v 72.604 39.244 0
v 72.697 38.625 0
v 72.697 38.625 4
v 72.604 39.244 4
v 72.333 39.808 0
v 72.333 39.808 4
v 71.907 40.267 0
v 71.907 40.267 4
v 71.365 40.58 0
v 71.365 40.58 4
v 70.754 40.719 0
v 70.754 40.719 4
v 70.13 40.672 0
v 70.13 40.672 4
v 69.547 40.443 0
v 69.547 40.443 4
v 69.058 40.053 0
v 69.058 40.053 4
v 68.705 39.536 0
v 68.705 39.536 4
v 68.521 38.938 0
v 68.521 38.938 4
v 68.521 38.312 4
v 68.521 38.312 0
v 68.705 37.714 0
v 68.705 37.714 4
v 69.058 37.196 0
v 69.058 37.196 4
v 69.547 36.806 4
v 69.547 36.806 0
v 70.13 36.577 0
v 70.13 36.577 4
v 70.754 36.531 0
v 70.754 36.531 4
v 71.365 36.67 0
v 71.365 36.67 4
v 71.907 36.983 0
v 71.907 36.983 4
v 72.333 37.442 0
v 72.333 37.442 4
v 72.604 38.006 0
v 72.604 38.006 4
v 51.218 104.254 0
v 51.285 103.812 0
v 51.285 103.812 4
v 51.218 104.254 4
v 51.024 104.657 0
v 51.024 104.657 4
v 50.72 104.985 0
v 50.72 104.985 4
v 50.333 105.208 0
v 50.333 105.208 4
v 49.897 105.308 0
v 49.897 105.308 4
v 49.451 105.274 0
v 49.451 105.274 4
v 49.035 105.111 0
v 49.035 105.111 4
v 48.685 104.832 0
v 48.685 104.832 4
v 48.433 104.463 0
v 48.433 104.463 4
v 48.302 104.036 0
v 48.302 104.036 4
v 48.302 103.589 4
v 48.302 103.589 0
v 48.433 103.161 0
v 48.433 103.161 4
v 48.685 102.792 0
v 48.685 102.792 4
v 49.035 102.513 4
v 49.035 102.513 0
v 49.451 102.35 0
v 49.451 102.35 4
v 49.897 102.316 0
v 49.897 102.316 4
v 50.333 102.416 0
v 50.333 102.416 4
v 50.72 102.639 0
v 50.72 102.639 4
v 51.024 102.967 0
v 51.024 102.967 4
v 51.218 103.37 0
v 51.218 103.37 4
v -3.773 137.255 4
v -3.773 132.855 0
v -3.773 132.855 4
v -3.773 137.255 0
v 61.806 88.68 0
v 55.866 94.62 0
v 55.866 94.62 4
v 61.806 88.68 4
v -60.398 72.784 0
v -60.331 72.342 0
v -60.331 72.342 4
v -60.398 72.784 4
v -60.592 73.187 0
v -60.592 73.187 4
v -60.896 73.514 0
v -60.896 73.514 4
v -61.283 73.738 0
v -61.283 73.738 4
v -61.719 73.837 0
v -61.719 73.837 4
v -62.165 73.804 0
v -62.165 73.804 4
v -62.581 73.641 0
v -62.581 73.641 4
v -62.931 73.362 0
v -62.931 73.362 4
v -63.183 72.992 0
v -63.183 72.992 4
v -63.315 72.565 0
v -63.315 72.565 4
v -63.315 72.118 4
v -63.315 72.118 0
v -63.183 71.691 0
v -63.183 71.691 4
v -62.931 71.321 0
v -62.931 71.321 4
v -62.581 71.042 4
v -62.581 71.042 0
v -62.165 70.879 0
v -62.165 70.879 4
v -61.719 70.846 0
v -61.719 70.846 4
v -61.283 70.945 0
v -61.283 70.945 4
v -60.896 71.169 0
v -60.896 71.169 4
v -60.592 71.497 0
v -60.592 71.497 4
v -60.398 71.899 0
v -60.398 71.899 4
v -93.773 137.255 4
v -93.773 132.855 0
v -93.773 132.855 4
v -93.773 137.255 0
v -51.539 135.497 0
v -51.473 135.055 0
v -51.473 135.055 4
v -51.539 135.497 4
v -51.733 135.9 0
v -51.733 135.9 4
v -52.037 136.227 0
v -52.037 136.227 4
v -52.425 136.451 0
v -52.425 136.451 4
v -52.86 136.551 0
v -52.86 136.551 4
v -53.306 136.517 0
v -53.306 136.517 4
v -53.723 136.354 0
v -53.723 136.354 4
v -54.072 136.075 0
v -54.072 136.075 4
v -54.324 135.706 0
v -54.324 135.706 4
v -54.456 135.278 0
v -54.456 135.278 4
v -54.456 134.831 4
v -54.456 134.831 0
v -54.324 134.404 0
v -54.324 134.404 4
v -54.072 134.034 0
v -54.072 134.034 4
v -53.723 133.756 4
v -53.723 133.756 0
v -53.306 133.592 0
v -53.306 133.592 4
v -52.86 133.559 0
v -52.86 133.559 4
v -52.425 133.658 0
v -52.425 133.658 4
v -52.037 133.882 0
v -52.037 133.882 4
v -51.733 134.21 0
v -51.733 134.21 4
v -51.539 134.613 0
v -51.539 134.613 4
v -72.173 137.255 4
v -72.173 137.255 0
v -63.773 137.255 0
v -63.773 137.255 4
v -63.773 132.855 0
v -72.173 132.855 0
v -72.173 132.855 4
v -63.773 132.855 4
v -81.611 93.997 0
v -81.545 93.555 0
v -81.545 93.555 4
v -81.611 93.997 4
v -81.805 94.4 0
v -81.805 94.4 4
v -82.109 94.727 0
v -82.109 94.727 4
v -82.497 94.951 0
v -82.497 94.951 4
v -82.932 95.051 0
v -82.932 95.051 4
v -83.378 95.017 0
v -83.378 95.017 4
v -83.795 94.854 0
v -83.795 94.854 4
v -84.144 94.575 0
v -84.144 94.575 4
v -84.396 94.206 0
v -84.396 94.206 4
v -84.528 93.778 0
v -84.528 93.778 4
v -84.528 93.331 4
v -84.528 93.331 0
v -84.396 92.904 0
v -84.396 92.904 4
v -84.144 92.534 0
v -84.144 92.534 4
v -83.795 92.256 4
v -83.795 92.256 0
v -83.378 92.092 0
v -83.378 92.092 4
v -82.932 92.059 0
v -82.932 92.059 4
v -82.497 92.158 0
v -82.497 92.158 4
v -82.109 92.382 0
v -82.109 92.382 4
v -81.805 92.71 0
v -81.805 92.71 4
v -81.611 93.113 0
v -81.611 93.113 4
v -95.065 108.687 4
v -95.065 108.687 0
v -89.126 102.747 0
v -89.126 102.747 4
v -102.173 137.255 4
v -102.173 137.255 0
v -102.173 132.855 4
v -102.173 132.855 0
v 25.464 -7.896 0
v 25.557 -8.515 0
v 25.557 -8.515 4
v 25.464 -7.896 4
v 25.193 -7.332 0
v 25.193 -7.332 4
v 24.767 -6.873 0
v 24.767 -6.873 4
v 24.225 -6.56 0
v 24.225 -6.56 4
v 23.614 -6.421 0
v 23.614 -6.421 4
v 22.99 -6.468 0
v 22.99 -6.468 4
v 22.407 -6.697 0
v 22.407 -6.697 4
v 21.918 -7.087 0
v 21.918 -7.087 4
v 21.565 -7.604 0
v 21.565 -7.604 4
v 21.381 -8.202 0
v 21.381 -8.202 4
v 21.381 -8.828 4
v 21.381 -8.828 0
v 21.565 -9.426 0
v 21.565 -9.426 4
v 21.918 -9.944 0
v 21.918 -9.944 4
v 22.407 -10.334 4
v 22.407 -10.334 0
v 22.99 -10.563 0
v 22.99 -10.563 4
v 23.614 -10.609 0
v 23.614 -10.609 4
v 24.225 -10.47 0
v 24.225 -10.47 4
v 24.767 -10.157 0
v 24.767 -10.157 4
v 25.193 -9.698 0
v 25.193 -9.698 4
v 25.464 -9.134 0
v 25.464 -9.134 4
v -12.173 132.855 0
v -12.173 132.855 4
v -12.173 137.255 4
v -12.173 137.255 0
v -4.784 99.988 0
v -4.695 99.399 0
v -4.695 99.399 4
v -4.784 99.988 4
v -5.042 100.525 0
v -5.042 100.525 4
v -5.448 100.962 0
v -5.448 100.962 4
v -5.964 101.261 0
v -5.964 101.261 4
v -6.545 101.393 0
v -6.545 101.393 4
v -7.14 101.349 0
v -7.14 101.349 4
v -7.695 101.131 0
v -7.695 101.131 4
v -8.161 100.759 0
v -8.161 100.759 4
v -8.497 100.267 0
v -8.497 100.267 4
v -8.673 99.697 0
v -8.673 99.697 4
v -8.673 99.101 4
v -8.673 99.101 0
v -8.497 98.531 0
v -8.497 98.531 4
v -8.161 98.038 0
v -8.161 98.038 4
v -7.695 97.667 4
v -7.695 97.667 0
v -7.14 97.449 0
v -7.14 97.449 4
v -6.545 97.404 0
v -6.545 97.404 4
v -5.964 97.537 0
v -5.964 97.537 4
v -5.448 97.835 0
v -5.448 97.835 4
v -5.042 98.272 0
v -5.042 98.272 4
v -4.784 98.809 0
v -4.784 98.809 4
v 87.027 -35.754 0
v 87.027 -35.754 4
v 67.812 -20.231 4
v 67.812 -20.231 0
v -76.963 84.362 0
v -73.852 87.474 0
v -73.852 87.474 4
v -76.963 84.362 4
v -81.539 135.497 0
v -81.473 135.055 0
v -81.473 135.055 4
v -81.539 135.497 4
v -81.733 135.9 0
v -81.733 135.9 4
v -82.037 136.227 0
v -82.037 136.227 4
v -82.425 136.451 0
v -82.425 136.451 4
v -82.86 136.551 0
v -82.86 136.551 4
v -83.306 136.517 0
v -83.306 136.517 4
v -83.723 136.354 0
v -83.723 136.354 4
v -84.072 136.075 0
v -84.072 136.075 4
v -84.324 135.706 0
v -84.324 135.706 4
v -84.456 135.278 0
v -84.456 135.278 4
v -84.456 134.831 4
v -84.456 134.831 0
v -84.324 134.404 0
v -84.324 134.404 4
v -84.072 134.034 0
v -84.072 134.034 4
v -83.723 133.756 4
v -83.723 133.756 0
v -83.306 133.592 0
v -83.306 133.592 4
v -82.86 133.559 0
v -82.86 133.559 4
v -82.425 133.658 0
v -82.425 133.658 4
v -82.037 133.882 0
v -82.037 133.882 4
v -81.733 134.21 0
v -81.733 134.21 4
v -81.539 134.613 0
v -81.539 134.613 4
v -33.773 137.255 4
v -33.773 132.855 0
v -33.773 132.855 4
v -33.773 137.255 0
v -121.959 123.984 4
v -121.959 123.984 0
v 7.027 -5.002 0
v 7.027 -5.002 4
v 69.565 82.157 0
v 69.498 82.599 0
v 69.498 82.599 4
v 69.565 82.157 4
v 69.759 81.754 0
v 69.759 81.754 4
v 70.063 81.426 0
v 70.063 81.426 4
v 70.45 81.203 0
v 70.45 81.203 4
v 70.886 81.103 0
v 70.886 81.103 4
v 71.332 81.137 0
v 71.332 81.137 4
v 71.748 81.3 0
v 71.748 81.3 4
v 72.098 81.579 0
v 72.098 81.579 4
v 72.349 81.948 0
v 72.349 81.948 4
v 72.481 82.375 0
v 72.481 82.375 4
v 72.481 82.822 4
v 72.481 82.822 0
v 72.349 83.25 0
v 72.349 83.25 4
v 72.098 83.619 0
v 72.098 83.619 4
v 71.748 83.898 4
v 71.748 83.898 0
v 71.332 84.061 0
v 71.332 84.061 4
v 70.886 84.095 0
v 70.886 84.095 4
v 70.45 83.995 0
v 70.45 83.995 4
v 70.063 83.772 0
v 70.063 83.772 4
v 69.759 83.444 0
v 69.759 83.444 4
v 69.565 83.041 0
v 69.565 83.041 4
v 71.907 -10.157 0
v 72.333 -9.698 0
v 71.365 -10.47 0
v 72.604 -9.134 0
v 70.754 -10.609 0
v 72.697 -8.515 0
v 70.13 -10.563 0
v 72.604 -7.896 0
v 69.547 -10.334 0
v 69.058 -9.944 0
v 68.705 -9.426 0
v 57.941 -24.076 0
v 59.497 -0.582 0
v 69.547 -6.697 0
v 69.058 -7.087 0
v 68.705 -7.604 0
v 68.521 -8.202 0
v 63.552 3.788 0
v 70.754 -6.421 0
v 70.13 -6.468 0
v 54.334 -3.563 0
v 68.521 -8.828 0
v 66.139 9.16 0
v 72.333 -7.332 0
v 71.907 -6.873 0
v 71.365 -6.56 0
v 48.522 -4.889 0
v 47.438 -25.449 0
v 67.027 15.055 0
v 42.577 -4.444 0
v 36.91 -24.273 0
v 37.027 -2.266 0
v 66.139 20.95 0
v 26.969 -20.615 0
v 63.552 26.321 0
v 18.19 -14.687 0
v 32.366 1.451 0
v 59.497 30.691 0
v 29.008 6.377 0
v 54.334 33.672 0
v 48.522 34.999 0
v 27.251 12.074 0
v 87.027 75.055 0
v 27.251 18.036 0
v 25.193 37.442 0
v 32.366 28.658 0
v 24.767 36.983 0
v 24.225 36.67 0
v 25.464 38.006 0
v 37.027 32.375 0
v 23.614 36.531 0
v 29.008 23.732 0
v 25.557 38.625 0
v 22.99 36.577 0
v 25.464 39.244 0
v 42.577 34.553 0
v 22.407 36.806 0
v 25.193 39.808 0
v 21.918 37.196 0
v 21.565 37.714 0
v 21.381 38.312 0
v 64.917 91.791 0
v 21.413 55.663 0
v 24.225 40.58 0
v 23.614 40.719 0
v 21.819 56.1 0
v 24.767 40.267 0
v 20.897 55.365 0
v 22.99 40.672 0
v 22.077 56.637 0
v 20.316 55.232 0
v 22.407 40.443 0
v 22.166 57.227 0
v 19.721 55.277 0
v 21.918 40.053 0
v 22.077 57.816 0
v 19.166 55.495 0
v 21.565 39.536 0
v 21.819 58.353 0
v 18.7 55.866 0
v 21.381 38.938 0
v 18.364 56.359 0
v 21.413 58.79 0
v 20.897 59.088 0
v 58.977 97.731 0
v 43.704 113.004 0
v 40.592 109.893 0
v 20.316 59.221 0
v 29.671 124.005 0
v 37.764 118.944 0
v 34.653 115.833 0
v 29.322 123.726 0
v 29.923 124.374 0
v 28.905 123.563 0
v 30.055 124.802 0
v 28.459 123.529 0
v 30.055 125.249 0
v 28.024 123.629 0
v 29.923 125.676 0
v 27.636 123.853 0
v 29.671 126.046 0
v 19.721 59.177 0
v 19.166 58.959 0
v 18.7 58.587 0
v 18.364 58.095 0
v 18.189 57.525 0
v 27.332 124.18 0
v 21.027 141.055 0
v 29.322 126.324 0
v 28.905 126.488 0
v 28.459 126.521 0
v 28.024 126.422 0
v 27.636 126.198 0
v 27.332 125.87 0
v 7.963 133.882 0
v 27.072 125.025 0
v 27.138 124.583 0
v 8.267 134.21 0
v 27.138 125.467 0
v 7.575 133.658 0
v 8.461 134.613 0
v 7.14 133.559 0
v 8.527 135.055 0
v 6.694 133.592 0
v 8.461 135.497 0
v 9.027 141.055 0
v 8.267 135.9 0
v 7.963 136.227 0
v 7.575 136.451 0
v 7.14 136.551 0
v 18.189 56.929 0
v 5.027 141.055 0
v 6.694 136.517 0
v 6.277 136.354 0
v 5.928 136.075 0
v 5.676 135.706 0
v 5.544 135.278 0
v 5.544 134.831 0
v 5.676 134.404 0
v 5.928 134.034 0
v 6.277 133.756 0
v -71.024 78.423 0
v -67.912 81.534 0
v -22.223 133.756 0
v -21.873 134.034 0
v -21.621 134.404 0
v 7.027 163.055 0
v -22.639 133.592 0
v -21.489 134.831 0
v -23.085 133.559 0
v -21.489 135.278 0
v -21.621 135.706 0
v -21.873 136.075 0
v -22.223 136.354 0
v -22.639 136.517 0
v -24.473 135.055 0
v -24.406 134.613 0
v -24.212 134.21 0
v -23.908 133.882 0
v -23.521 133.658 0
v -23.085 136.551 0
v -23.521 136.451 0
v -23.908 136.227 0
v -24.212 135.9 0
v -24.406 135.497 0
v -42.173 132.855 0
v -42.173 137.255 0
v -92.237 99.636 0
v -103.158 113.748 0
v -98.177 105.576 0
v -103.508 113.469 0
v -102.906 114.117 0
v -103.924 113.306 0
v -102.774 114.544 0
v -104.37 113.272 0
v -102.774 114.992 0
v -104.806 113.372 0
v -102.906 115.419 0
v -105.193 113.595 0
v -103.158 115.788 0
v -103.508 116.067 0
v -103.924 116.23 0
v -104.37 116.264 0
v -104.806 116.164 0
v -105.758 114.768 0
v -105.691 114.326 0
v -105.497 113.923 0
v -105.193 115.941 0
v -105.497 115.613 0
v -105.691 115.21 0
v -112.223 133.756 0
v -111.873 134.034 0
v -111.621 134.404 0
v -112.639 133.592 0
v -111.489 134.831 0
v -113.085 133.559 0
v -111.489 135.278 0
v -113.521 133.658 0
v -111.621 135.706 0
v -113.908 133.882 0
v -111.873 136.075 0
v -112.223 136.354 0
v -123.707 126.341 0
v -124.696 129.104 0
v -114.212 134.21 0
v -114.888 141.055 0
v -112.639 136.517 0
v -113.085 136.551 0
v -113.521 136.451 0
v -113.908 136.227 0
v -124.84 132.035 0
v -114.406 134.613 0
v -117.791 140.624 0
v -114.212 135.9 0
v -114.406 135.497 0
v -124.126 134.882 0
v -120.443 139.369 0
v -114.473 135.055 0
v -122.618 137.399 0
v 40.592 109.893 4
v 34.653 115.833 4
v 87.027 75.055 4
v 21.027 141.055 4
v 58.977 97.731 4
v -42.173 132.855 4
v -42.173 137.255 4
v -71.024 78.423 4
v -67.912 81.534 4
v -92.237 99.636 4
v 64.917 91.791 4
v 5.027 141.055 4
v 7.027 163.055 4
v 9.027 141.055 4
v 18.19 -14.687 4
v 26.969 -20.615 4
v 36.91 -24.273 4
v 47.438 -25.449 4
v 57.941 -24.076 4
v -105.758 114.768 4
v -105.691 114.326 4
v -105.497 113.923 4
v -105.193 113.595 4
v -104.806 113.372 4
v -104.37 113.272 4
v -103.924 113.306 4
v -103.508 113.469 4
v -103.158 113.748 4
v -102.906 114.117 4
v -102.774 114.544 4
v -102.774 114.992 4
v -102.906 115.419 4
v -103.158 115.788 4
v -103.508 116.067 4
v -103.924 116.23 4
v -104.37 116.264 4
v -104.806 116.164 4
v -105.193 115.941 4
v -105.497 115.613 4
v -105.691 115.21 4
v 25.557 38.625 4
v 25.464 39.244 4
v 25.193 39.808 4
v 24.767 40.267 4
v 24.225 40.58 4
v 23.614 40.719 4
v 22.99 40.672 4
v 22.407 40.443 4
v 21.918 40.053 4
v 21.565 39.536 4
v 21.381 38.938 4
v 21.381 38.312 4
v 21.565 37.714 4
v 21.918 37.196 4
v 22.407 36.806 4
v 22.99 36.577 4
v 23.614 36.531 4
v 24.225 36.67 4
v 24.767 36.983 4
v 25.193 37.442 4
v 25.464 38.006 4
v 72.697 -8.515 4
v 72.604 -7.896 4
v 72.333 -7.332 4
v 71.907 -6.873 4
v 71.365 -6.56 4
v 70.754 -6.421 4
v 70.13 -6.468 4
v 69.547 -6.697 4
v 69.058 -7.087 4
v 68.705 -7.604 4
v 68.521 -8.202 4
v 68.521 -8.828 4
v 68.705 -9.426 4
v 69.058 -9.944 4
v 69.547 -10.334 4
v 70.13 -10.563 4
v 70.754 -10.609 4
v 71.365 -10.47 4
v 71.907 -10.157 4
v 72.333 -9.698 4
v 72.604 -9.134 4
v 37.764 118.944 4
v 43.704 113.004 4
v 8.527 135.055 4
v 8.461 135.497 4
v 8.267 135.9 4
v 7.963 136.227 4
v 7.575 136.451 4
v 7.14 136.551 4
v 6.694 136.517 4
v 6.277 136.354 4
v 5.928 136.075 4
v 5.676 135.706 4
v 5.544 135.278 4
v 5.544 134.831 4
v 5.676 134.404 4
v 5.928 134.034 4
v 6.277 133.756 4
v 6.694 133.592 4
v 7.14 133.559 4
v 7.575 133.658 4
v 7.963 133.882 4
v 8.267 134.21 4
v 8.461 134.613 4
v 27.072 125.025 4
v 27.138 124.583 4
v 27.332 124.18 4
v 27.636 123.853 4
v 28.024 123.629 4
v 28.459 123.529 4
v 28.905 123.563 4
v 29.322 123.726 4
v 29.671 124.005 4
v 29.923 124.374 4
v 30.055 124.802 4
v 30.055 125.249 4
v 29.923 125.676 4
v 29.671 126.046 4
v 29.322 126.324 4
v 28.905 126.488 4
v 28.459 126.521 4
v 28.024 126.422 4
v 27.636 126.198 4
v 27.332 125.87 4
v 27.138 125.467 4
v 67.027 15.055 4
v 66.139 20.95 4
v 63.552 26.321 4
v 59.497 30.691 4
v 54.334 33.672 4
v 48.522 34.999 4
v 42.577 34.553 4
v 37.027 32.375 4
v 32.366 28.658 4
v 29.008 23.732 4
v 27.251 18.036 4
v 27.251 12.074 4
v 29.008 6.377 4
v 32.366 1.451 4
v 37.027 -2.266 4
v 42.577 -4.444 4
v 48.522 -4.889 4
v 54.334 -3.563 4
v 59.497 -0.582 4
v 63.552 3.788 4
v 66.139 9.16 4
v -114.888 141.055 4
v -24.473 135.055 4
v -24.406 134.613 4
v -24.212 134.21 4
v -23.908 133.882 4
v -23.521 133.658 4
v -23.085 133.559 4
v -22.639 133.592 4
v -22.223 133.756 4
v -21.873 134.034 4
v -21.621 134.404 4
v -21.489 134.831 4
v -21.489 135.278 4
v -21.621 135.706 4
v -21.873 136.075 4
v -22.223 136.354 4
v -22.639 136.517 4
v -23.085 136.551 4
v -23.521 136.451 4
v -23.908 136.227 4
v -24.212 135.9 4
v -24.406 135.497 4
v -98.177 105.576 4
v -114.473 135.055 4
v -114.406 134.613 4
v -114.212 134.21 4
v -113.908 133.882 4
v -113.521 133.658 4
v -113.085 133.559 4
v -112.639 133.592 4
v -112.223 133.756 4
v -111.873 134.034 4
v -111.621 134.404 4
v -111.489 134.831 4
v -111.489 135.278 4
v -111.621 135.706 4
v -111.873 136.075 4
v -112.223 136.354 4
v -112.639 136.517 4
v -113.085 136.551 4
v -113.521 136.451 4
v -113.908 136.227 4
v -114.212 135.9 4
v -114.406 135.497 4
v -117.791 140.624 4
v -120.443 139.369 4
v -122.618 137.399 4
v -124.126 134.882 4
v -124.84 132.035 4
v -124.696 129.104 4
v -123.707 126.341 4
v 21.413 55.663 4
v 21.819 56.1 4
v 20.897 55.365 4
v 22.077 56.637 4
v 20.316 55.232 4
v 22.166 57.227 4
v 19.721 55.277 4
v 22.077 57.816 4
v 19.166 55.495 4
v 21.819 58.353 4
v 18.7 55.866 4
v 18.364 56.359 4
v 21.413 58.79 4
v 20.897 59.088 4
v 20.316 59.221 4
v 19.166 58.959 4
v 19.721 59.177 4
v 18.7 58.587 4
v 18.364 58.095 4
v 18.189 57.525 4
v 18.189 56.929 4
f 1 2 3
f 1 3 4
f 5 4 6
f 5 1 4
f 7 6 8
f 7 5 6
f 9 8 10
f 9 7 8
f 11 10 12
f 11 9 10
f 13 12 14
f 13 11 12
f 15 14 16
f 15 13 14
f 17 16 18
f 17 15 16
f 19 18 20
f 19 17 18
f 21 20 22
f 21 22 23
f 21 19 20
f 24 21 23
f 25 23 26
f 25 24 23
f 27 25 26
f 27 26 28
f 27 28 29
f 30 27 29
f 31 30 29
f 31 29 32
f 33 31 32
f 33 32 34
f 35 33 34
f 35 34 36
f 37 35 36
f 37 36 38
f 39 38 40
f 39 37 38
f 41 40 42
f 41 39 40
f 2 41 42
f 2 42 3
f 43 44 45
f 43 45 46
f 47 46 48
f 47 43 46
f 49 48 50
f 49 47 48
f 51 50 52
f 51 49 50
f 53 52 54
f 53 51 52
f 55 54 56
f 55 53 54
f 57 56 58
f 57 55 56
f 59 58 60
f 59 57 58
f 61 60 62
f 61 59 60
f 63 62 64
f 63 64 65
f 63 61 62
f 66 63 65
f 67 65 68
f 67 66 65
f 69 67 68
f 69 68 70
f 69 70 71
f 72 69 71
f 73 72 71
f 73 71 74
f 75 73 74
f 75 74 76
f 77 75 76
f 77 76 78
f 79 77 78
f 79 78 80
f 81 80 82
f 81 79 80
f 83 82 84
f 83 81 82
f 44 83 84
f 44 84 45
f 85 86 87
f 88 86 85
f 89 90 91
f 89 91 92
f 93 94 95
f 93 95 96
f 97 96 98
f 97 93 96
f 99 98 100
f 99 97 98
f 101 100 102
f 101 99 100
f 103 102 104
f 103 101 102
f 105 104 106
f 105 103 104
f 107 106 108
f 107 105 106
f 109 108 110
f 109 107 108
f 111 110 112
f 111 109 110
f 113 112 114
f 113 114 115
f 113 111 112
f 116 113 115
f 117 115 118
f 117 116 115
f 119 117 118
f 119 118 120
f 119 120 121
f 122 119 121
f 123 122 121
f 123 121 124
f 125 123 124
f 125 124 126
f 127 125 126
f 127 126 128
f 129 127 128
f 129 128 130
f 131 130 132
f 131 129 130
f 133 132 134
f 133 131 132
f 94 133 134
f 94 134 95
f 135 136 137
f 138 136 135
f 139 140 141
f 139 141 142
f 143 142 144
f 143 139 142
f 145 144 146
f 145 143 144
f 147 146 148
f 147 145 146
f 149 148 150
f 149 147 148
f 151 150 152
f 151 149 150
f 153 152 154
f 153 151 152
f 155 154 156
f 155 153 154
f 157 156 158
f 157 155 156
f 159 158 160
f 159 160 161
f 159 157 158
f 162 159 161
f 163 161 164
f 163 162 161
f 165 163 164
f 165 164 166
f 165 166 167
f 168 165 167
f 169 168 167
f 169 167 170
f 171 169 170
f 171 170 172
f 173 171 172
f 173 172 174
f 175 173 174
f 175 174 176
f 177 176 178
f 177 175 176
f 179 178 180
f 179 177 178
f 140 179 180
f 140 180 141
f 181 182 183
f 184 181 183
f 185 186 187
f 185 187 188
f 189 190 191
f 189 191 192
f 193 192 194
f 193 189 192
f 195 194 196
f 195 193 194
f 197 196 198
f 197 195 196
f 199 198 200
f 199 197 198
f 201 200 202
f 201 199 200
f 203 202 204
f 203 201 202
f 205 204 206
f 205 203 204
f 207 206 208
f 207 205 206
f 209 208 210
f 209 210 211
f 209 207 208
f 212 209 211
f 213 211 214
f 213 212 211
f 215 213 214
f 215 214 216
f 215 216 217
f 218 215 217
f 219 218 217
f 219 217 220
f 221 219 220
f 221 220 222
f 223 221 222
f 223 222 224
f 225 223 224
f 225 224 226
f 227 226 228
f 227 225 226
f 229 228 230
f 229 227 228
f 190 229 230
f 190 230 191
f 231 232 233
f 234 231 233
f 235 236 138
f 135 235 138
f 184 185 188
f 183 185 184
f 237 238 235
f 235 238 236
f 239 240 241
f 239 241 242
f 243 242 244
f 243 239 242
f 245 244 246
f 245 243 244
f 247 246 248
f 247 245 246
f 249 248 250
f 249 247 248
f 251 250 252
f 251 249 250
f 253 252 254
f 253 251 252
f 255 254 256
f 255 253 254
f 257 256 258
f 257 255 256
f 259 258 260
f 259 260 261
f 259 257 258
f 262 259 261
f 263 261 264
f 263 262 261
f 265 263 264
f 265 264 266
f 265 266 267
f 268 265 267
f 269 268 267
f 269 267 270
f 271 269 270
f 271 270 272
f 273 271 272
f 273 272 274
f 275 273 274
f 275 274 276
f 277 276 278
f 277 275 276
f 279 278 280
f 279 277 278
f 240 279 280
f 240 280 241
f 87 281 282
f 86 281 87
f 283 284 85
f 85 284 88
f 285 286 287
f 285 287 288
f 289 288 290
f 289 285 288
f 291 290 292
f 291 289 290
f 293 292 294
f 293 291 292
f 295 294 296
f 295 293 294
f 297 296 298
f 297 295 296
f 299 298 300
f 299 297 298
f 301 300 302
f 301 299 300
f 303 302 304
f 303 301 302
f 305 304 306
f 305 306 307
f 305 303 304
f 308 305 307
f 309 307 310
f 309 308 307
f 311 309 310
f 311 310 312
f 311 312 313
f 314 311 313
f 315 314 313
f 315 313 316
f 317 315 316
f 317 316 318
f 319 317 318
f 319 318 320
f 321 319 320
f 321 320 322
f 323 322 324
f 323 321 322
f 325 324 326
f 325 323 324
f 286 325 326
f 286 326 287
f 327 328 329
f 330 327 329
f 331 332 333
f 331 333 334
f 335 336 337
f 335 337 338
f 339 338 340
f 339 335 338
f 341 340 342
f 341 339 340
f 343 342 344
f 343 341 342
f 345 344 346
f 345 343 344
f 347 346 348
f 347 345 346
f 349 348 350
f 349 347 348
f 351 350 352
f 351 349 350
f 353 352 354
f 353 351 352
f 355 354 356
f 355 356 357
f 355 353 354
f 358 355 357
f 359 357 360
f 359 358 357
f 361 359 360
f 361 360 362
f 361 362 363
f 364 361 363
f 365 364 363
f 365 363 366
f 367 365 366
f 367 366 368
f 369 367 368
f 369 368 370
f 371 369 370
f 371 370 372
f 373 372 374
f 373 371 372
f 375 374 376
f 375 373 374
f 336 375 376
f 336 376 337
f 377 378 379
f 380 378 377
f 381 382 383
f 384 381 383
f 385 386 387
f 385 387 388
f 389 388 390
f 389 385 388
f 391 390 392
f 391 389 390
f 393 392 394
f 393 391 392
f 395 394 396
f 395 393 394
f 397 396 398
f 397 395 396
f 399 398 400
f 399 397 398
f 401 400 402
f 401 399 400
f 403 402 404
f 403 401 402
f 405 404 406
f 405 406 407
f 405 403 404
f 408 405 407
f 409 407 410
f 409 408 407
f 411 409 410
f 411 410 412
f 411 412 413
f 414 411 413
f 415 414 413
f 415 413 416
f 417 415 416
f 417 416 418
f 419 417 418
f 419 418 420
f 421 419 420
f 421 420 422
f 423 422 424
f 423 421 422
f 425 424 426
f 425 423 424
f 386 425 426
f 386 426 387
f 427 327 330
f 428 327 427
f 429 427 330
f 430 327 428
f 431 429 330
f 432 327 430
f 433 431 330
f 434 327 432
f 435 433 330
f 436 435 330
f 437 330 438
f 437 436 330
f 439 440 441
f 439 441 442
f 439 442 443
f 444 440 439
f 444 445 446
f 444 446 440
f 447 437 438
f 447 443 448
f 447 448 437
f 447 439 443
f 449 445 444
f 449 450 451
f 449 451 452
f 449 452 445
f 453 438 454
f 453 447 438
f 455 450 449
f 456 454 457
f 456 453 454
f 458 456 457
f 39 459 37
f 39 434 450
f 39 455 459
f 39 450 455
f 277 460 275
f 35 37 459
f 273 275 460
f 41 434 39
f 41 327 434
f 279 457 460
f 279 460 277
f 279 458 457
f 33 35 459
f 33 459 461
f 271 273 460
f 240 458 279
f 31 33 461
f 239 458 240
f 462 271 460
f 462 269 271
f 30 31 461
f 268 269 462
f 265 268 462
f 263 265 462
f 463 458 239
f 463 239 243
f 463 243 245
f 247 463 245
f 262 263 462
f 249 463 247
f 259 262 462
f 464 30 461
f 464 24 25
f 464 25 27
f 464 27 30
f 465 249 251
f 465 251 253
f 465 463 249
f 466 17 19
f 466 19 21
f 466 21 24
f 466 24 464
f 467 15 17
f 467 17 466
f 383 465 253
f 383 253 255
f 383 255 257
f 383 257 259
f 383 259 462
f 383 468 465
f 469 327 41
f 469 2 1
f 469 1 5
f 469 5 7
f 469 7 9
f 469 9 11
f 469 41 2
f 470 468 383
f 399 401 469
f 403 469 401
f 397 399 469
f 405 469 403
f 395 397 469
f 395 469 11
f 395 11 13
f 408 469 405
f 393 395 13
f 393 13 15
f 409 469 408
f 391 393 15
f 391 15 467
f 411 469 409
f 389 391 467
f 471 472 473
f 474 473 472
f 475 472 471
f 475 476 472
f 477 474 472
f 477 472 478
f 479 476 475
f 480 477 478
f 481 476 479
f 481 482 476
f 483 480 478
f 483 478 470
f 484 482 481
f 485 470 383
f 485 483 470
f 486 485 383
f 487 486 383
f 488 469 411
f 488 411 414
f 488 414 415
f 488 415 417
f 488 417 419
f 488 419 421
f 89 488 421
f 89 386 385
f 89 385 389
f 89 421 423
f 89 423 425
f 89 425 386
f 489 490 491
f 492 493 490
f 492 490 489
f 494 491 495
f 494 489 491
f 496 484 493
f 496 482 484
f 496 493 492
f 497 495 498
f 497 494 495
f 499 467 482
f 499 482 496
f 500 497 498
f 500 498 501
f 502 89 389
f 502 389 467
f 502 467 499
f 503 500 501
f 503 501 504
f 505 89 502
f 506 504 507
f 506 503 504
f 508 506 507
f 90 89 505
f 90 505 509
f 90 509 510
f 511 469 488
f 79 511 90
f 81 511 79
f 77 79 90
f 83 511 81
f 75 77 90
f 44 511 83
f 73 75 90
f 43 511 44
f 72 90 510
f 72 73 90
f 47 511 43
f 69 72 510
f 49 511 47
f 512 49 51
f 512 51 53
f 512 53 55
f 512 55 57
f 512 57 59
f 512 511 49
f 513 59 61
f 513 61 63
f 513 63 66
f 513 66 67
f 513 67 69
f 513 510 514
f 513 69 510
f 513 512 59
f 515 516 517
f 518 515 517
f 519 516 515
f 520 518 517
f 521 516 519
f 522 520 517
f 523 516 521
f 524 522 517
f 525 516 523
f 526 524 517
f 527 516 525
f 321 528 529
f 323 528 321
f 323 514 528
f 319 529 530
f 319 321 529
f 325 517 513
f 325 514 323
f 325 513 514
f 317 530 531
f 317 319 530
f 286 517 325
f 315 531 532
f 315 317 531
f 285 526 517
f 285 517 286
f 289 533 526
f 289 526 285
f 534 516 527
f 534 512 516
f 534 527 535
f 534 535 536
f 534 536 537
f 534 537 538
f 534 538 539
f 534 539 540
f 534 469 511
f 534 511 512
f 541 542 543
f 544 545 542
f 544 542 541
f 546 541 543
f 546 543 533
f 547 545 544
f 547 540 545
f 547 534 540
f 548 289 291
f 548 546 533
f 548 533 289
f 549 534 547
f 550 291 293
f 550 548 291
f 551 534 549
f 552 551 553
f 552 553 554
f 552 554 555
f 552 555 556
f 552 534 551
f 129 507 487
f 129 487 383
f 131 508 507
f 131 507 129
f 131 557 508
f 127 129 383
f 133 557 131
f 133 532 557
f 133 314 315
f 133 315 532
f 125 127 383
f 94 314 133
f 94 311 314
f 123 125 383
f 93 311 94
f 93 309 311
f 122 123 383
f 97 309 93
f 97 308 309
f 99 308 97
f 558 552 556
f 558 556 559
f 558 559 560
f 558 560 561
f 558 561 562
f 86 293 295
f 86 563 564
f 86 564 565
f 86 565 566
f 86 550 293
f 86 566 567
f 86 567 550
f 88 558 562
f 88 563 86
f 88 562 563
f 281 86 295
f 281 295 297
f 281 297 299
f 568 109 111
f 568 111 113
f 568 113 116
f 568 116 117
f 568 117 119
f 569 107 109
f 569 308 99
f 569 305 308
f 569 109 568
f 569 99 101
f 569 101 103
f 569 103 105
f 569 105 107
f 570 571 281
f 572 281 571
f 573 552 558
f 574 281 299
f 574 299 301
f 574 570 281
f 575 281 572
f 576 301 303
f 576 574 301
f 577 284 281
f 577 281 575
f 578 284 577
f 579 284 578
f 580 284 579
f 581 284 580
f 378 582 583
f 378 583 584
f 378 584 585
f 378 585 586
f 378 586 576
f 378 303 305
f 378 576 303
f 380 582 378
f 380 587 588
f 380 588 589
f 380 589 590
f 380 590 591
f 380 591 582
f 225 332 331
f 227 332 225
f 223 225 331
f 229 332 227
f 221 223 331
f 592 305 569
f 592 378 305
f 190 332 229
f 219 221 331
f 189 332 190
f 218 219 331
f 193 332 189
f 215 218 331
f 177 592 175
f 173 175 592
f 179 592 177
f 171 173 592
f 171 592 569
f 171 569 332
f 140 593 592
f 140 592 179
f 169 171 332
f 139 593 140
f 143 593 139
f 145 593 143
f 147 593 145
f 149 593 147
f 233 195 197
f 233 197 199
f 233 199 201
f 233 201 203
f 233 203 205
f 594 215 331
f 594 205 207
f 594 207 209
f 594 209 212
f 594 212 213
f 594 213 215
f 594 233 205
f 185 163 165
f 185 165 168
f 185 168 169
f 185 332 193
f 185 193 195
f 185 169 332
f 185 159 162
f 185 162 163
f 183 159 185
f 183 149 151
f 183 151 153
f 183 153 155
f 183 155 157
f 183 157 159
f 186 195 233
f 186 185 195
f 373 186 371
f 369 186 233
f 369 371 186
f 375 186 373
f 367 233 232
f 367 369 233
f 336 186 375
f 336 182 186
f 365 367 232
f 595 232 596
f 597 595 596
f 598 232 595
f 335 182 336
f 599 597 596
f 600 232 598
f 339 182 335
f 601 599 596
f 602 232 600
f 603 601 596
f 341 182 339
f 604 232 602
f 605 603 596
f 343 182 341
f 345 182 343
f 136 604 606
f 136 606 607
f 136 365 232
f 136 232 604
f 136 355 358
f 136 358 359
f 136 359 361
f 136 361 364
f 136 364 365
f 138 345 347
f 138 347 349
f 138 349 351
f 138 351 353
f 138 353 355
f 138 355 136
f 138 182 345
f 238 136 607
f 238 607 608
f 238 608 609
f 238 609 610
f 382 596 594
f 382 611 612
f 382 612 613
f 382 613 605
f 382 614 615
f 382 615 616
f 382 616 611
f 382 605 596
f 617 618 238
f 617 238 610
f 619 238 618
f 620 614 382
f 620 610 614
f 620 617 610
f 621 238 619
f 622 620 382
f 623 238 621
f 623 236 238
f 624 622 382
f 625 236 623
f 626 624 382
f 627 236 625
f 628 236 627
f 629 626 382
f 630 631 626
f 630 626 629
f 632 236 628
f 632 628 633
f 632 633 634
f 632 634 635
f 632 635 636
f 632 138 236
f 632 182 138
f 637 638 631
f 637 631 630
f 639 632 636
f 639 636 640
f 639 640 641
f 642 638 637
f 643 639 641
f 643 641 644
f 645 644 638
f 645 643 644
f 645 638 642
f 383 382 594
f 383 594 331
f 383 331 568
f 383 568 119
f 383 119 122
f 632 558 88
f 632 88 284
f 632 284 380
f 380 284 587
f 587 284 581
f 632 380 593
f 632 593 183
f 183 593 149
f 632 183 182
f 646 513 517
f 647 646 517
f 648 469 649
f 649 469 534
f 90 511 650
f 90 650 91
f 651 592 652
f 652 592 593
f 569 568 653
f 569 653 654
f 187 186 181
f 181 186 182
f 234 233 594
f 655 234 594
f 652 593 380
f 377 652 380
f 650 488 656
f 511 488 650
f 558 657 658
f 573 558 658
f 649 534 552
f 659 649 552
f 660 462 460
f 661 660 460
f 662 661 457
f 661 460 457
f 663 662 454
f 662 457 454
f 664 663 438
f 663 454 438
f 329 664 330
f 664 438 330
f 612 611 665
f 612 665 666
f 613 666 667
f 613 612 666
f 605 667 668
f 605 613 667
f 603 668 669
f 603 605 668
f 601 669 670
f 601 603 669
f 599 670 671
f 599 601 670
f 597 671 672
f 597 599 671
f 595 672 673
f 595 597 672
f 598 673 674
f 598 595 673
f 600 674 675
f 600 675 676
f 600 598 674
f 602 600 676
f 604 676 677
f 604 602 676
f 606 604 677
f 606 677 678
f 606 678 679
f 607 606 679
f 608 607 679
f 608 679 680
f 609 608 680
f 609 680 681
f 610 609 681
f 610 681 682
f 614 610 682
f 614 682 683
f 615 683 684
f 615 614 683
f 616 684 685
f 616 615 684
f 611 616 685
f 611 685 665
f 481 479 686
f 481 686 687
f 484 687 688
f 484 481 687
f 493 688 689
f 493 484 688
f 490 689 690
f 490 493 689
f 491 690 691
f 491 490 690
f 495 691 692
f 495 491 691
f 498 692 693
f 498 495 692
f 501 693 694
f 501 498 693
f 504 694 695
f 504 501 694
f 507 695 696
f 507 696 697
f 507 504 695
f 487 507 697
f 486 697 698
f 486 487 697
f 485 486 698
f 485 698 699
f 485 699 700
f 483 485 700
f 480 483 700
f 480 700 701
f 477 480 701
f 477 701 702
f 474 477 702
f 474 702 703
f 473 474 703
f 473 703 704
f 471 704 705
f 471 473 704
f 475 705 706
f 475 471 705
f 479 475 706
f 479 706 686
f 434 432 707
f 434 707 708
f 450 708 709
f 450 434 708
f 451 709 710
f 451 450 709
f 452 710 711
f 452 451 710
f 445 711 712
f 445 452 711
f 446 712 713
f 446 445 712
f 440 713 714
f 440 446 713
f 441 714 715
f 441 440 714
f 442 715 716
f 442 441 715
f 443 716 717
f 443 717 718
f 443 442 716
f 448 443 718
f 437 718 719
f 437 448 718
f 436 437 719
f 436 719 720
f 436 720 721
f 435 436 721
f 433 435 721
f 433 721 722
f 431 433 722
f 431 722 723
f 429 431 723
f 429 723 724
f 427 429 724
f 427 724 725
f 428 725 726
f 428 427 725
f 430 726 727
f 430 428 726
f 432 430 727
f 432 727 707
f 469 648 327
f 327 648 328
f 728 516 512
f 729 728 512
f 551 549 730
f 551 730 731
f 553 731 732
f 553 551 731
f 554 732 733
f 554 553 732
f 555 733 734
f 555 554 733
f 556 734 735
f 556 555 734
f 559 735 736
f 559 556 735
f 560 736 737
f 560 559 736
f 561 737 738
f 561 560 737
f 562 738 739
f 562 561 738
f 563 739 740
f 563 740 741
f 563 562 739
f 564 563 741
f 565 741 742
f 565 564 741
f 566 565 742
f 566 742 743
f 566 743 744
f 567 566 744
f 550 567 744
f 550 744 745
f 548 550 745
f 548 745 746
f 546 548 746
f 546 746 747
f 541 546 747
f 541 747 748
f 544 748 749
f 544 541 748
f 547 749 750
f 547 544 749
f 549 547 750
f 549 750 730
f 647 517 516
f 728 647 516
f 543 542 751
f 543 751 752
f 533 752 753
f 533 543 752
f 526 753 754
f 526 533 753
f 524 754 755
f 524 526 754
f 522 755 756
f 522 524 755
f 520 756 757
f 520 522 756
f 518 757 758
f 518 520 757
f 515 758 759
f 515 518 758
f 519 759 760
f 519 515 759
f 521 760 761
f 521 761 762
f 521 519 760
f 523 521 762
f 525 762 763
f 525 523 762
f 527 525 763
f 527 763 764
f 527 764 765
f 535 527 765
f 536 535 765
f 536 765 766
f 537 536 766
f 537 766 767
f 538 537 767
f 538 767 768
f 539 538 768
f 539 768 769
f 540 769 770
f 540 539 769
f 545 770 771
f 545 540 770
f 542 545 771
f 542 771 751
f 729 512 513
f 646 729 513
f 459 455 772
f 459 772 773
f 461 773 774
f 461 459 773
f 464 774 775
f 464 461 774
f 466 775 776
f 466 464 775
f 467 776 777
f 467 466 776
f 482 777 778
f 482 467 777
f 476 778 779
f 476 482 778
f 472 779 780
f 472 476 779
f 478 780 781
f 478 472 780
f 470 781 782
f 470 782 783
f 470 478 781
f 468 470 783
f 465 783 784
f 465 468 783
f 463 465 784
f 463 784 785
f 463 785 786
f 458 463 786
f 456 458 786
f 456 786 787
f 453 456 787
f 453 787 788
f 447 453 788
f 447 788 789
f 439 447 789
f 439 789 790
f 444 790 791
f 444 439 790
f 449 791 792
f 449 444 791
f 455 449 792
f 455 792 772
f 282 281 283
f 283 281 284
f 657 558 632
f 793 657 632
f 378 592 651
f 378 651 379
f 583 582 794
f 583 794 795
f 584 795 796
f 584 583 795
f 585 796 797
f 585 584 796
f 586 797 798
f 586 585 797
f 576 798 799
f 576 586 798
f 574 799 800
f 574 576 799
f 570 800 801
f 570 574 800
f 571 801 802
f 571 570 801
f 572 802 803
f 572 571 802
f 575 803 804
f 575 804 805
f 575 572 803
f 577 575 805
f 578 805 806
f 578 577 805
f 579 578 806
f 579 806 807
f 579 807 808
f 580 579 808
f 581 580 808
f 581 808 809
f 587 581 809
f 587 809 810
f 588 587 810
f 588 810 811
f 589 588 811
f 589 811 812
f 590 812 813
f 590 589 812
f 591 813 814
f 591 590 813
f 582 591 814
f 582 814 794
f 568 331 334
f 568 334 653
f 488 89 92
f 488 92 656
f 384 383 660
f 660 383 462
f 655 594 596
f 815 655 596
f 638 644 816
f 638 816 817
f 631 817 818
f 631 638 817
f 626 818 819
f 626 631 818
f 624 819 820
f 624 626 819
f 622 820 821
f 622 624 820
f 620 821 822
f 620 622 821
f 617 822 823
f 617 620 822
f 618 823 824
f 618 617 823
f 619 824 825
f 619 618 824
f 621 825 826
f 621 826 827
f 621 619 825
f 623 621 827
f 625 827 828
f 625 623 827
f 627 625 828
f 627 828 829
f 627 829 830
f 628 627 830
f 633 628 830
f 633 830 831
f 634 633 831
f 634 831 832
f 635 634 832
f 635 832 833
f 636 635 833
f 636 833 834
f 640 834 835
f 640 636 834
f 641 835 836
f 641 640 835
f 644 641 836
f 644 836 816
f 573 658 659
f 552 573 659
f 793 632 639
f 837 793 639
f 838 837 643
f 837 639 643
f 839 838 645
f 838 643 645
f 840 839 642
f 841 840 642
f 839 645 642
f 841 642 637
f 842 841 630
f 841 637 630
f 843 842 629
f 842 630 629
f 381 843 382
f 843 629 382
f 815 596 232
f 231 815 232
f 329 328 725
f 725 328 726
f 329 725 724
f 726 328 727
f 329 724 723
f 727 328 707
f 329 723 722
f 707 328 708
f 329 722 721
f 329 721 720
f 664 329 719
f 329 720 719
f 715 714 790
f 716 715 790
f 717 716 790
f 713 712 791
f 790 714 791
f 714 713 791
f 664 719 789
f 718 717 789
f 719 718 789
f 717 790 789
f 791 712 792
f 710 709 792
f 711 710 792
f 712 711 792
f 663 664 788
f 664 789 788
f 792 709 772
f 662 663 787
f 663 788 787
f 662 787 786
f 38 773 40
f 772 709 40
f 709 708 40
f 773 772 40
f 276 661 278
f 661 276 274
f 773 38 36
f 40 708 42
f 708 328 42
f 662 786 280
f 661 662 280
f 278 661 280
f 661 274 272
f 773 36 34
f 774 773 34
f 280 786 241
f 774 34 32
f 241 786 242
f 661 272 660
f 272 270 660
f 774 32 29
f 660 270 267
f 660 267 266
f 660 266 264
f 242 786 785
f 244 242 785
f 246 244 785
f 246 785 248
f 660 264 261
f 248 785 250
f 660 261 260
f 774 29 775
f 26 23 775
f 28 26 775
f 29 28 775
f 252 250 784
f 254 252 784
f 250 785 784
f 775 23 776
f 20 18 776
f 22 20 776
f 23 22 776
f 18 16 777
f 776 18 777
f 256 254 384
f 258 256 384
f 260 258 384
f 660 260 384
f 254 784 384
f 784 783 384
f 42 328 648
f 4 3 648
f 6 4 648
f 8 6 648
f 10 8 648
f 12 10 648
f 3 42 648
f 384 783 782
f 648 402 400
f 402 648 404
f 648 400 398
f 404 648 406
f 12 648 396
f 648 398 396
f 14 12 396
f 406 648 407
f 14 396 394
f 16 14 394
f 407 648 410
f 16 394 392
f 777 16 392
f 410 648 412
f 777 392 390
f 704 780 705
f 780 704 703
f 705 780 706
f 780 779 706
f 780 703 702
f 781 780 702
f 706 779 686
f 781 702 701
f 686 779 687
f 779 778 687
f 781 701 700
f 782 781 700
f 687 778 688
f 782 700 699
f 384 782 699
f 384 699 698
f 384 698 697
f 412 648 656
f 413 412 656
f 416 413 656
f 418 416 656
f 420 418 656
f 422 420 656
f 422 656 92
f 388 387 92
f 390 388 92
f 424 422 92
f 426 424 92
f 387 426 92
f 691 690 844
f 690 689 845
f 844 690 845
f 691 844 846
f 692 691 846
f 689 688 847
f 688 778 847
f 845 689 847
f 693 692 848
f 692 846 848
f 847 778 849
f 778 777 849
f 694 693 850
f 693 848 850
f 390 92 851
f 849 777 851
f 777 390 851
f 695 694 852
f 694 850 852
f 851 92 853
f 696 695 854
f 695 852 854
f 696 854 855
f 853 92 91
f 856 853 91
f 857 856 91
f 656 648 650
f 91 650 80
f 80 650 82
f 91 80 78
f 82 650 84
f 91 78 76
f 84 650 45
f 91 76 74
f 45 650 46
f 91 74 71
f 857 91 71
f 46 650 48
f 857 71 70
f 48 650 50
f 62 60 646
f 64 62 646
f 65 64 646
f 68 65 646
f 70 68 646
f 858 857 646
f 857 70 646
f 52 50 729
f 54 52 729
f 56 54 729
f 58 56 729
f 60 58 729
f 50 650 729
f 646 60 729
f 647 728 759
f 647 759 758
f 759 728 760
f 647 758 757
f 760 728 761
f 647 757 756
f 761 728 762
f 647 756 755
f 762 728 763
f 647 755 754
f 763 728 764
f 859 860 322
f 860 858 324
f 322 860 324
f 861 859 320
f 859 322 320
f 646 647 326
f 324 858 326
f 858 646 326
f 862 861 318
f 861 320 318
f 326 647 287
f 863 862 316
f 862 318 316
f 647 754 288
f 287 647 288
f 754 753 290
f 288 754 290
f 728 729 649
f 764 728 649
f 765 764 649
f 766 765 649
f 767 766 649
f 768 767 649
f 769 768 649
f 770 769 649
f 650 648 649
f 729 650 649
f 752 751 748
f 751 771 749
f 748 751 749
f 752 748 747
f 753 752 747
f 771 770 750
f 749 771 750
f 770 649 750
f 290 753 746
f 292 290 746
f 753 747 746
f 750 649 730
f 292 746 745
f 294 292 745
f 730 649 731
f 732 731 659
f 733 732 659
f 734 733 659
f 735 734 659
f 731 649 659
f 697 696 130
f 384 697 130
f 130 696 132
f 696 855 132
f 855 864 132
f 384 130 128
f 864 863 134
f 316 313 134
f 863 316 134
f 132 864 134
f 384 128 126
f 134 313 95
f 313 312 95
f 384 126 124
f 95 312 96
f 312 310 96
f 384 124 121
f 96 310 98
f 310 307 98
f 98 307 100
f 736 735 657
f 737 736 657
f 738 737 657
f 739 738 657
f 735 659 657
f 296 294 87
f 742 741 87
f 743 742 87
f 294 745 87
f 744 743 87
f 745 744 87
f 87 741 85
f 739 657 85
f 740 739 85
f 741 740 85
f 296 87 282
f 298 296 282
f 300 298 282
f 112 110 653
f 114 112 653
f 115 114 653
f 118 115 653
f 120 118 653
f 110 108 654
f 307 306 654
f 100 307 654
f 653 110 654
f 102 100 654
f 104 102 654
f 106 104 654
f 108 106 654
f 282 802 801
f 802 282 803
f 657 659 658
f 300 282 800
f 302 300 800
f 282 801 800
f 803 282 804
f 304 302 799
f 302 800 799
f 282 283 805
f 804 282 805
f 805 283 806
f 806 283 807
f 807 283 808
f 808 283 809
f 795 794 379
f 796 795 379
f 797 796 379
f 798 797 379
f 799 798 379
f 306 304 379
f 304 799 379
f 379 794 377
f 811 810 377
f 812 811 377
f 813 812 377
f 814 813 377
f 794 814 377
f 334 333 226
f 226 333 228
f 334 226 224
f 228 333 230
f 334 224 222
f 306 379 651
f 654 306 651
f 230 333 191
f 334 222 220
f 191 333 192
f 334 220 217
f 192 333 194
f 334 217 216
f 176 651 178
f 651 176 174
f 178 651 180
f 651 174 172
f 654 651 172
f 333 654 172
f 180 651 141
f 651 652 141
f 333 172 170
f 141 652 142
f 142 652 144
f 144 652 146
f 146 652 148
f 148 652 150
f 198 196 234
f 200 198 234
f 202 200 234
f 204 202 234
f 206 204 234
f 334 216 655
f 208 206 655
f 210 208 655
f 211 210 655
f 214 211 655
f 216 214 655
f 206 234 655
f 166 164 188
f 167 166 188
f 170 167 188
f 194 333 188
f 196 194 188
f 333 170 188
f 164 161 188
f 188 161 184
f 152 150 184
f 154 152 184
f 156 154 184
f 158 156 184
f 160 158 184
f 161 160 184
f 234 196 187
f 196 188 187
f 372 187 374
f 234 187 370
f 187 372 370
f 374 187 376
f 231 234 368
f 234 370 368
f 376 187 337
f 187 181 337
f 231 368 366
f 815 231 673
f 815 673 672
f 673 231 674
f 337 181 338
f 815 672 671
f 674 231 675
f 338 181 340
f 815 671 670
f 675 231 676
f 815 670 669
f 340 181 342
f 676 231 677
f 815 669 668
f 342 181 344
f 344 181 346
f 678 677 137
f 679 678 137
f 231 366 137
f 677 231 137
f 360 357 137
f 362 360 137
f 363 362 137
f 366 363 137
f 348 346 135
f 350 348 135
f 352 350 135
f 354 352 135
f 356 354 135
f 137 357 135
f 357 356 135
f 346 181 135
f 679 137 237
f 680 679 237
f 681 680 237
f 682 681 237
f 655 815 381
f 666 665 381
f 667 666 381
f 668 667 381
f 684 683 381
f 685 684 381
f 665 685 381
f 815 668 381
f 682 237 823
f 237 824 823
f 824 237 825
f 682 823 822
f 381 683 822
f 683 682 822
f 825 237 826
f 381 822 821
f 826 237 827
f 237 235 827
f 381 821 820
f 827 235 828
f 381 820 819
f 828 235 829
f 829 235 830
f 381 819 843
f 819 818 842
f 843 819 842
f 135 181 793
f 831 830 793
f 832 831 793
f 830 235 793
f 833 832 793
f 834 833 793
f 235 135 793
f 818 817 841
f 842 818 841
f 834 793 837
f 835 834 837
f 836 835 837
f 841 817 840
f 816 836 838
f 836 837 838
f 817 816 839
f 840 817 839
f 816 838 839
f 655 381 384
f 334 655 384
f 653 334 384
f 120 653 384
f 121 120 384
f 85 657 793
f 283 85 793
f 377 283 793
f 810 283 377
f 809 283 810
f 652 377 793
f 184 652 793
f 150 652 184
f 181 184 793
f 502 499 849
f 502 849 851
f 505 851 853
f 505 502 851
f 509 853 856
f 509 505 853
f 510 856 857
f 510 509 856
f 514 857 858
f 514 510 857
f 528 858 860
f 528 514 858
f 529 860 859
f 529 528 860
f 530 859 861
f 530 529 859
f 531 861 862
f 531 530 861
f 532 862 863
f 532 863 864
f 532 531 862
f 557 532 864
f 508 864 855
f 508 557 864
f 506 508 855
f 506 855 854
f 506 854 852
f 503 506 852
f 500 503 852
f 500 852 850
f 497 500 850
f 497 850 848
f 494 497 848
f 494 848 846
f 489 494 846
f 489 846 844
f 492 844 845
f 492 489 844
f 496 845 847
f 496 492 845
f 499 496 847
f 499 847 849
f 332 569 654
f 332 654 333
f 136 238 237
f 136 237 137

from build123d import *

# Parameters (mm, degrees)
SKETCH_1_R      = 1.5
SKETCH_1_R_2    = 20
SKETCH_1_R_3    = 2.1
SKETCH_1_R_4    = 2
SKETCH_1_W      = 8.4
SKETCH_1_H      = 4.4
EXTRUDE_1_DEPTH = 4
EXTRUDE_2_DEPTH = 4
EXTRUDE_4_DEPTH = 4


with BuildPart() as part:
    # 草图1 → 凸台-拉伸1 (new body)
    with BuildSketch(Plane.XY):
        with BuildLine():
            Line((7.027428163, -5.002489357), (18.190287148, -14.686974418))
            ThreePointArc((18.190287148, -14.686974418), (47.018030055, -25.451404949), (75.84881126, -14.695114654))
            Line((75.84881126, -14.695114654), (87.027428163, -5.002489357))
            Line((87.027428163, -5.002489357), (87.027428163, 75.054738201))
            Line((87.027428163, 75.054738201), (21.027428163, 141.054738201))
            Line((21.027428163, 141.054738201), (-114.887663771, 141.054738201))
            ThreePointArc((-114.887663771, 141.054738201), (-124.126459096, 134.881572525), (-121.958731583, 123.983670389))
            Line((-121.958731583, 123.983670389), (-90.203942848, 92.228881654))
            Line((-90.203942848, 92.228881654), (7.027428163, -5.002489357))
        make_face()
        with Locations((-52.972571837, 135.054738201)):
            Circle(SKETCH_1_R, mode=Mode.SUBTRACT)
        with Locations((47.027428163, 15.054738201)):
            Circle(SKETCH_1_R_2, mode=Mode.SUBTRACT)
        with Locations(Location((-22.972571837, 135.054738201, 0), (0, 0, 180))):
            Circle(SKETCH_1_R, mode=Mode.SUBTRACT)
        with Locations((7.027428163, 135.054738201)):
            Circle(SKETCH_1_R, mode=Mode.SUBTRACT)
        with Locations(Location((-112.972571837, 135.054738201, 0), (0, 0, 180))):
            Circle(SKETCH_1_R, mode=Mode.SUBTRACT)
        with Locations((-82.972571837, 135.054738201)):
            Circle(SKETCH_1_R, mode=Mode.SUBTRACT)
        with Locations((49.784787476, 103.812097514)):
            Circle(SKETCH_1_R, mode=Mode.SUBTRACT)
        with Locations(Location((70.997990912, 82.598894078, 0), (0, 0, 180))):
            Circle(SKETCH_1_R, mode=Mode.SUBTRACT)
        with Locations(Location((28.571584041, 125.025300949, 0), (0, 0, 180))):
            Circle(SKETCH_1_R, mode=Mode.SUBTRACT)
        with Locations((70.597428163, 38.624738201)):
            Circle(SKETCH_1_R_3, mode=Mode.SUBTRACT)
        with Locations((70.597428163, -8.515261799)):
            Circle(SKETCH_1_R_3, mode=Mode.SUBTRACT)
        with Locations((23.457428163, -8.515261799)):
            Circle(SKETCH_1_R_3, mode=Mode.SUBTRACT)
        with Locations((23.457428163, 38.624738201)):
            Circle(SKETCH_1_R_3, mode=Mode.SUBTRACT)
        with Locations((-83.04451802, 93.554738201)):
            Circle(SKETCH_1_R, mode=Mode.SUBTRACT)
        with Locations((-61.831314585, 72.341534765)):
            Circle(SKETCH_1_R, mode=Mode.SUBTRACT)
        with Locations(Location((-104.257721456, 114.767941637, 0), (0, 0, 180))):
            Circle(SKETCH_1_R, mode=Mode.SUBTRACT)
        with Locations((20.166275086, 57.226748532)):
            Circle(SKETCH_1_R_4, mode=Mode.SUBTRACT)
        with Locations((-6.694877991, 99.398758863)):
            Circle(SKETCH_1_R_4, mode=Mode.SUBTRACT)
        with Locations((-37.972571837, 135.054738201)):
            Rectangle(SKETCH_1_W, SKETCH_1_H, mode=Mode.SUBTRACT)
        with Locations((-7.972571837, 135.054738201)):
            Rectangle(SKETCH_1_W, SKETCH_1_H, mode=Mode.SUBTRACT)
        with Locations((-97.972571837, 135.054738201)):
            Rectangle(SKETCH_1_W, SKETCH_1_H, mode=Mode.SUBTRACT)
        with Locations((-67.972571837, 135.054738201)):
            Rectangle(SKETCH_1_W, SKETCH_1_H, mode=Mode.SUBTRACT)
        Polygon((55.865905794, 94.619709358), (61.805602756, 88.680012396), (64.916872594, 91.791282234), (58.977175632, 97.730979196), align=None, mode=Mode.SUBTRACT)
        Polygon((34.652702359, 115.832912794), (37.763972196, 118.944182631), (43.703669158, 113.004485669), (40.592399321, 109.893215832), align=None, mode=Mode.SUBTRACT)
        Polygon((-73.852129865, 87.473619883), (-76.963399702, 84.362350046), (-71.02370274, 78.422653084), (-67.912432903, 81.533922921), align=None, mode=Mode.SUBTRACT)
        Polygon((-89.125636339, 102.747126356), (-92.236906176, 99.635856519), (-98.176603138, 105.575553481), (-95.065333301, 108.686823318), align=None, mode=Mode.SUBTRACT)
    extrude(amount=EXTRUDE_1_DEPTH)

    # 草图2 → 凸台-拉伸2 (add)
    with BuildSketch(Plane.XY.offset(4)):
        Polygon((87.027428163, -5.002489357), (87.027428163, -35.754116483), (67.811833288, -20.231246124), align=None)
    extrude(amount=-EXTRUDE_2_DEPTH)

    # 草图3 → 凸台-拉伸4 (add)
    with BuildSketch(Plane.XY.offset(4)):
        Polygon((7.027428163, 141.054738201), (5.027428163, 141.054738201), (7.027428163, 163.054738201), (9.027428163, 141.054738201), align=None)
    extrude(amount=-EXTRUDE_4_DEPTH)


solid = part.part
